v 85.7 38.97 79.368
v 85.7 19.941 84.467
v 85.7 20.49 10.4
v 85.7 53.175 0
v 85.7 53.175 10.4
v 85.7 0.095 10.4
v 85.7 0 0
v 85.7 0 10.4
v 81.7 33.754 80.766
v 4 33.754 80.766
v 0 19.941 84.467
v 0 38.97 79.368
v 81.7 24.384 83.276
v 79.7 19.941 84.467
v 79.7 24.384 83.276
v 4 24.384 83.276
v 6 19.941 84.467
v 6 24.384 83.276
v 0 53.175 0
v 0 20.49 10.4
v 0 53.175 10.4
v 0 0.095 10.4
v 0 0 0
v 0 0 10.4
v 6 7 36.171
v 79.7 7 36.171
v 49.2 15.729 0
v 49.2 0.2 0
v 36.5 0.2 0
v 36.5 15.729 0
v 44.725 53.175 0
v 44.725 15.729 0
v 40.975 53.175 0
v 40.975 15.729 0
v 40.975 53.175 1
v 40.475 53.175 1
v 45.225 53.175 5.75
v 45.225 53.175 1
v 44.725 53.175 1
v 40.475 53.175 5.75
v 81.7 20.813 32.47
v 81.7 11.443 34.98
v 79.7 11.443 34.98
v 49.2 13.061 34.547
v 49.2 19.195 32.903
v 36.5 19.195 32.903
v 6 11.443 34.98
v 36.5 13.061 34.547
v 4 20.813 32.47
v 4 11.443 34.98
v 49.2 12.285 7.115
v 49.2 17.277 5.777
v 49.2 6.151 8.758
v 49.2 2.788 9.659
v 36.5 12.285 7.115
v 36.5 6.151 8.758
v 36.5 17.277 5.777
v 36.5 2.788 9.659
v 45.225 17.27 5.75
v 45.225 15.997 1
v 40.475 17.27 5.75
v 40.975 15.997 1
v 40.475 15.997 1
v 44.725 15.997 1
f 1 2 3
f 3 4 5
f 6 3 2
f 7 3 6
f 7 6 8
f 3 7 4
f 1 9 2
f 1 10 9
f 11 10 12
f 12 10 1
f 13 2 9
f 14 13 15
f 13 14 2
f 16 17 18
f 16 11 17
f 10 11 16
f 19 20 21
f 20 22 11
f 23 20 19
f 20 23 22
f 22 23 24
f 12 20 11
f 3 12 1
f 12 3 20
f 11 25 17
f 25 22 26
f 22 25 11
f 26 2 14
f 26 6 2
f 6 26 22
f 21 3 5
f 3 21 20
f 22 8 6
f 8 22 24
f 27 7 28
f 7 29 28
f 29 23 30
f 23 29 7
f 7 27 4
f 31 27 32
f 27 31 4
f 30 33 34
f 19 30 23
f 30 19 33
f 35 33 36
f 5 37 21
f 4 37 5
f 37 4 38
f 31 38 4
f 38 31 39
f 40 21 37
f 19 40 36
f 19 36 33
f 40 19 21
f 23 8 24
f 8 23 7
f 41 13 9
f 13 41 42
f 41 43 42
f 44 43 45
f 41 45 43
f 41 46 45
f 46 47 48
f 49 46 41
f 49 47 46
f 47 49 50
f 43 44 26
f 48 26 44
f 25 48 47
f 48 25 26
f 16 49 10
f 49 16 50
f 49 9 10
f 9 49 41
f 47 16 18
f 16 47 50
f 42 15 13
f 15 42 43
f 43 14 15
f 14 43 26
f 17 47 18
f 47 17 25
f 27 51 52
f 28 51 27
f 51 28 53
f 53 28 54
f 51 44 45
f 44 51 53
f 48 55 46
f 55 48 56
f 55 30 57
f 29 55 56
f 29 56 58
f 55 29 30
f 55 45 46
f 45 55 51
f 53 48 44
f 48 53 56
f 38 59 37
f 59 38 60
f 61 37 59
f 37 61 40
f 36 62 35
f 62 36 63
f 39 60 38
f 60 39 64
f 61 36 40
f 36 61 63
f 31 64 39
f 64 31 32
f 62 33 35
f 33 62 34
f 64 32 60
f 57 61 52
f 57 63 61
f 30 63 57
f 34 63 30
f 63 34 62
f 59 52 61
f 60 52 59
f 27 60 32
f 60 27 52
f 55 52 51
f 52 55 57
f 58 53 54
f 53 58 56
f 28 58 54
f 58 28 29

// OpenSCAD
//Variables

//Print the Stand, the Fit test or Both?
part = "Stand"; // [Stand:Full Stand,Test:Fit Test,Both:Print Both]

//All measurements in milimeters
//Width of the phone/tablet
width = 77.7;
//Thickness of the phone/tablet
thick = 9.7;
//Center of the USB jack from left
usbc = 38.85;
//Adjust USB +/- from center, front to back
usboff = 0;
//Width of USB connector shell
usbx = 12.7;
//Thickness of USB connector shell
usby = 6.35;
//Height of USB connector shell, including strain relief
usbz = 31.75;
//Diameter of USB cable
usbd = 4.75;
//Height of the cradle around the phone/tablet (for finished Stand only)
height = 50;
//Total Height of the TEST cradle (for fit test only)
theight = 20;

print_part();

module print_part() {
    if (part == "Stand"){
        stand();
    }else if (part == "Test"){
        test();
    }else if (part == "Both"){
        stand();
        test();
    }
}
//
module stand(){
difference(){
union(){
    rotate([-15,0,0])
        translate([0,-2.6,10])
            cube([width+8,thick+10,height+usbz-5]);
    cube([width+8,(usbz/10)+height,10.4]);
}
rotate([-15,0,0]){
    union(){
        translate([4,2,usbz+5])
            cube([width,thick,height+1]);
        translate([6,-thick,usbz+5])
            cube([width-4,thick+10,height+1]);
        translate([4+usbc-(usbx/2),2+(thick/2)-(usby/2)+usboff,5])
            cube([usbx,usby,usbz+1]);
    }
}
translate([4+usbc-(usbd/2),usboff+10,5.75-usbd])
    cube([usbd,(usbz/2)+height,usbd]);
translate([4.5+usbc-(usbd/2),usboff+10,-1])
    cube([usbd-1,(usbz/2)+height,usbd]);
translate([usbc-usbx/2+4,usboff+0.2,0])
    rotate([-15,0,0])
        cube([usbx,15,10]);
}}

module test(){
difference(){
    union(){
        cube([width+2,thick+2,theight+2]);
    }
    union(){
        translate([1,1,1])
            cube([width,thick,100]);
        translate([1+usbc-(usbx/2),1+(thick/2)-(usby/2)+usboff,-1])
            cube([usbx,usby,20]);
    }
}}
